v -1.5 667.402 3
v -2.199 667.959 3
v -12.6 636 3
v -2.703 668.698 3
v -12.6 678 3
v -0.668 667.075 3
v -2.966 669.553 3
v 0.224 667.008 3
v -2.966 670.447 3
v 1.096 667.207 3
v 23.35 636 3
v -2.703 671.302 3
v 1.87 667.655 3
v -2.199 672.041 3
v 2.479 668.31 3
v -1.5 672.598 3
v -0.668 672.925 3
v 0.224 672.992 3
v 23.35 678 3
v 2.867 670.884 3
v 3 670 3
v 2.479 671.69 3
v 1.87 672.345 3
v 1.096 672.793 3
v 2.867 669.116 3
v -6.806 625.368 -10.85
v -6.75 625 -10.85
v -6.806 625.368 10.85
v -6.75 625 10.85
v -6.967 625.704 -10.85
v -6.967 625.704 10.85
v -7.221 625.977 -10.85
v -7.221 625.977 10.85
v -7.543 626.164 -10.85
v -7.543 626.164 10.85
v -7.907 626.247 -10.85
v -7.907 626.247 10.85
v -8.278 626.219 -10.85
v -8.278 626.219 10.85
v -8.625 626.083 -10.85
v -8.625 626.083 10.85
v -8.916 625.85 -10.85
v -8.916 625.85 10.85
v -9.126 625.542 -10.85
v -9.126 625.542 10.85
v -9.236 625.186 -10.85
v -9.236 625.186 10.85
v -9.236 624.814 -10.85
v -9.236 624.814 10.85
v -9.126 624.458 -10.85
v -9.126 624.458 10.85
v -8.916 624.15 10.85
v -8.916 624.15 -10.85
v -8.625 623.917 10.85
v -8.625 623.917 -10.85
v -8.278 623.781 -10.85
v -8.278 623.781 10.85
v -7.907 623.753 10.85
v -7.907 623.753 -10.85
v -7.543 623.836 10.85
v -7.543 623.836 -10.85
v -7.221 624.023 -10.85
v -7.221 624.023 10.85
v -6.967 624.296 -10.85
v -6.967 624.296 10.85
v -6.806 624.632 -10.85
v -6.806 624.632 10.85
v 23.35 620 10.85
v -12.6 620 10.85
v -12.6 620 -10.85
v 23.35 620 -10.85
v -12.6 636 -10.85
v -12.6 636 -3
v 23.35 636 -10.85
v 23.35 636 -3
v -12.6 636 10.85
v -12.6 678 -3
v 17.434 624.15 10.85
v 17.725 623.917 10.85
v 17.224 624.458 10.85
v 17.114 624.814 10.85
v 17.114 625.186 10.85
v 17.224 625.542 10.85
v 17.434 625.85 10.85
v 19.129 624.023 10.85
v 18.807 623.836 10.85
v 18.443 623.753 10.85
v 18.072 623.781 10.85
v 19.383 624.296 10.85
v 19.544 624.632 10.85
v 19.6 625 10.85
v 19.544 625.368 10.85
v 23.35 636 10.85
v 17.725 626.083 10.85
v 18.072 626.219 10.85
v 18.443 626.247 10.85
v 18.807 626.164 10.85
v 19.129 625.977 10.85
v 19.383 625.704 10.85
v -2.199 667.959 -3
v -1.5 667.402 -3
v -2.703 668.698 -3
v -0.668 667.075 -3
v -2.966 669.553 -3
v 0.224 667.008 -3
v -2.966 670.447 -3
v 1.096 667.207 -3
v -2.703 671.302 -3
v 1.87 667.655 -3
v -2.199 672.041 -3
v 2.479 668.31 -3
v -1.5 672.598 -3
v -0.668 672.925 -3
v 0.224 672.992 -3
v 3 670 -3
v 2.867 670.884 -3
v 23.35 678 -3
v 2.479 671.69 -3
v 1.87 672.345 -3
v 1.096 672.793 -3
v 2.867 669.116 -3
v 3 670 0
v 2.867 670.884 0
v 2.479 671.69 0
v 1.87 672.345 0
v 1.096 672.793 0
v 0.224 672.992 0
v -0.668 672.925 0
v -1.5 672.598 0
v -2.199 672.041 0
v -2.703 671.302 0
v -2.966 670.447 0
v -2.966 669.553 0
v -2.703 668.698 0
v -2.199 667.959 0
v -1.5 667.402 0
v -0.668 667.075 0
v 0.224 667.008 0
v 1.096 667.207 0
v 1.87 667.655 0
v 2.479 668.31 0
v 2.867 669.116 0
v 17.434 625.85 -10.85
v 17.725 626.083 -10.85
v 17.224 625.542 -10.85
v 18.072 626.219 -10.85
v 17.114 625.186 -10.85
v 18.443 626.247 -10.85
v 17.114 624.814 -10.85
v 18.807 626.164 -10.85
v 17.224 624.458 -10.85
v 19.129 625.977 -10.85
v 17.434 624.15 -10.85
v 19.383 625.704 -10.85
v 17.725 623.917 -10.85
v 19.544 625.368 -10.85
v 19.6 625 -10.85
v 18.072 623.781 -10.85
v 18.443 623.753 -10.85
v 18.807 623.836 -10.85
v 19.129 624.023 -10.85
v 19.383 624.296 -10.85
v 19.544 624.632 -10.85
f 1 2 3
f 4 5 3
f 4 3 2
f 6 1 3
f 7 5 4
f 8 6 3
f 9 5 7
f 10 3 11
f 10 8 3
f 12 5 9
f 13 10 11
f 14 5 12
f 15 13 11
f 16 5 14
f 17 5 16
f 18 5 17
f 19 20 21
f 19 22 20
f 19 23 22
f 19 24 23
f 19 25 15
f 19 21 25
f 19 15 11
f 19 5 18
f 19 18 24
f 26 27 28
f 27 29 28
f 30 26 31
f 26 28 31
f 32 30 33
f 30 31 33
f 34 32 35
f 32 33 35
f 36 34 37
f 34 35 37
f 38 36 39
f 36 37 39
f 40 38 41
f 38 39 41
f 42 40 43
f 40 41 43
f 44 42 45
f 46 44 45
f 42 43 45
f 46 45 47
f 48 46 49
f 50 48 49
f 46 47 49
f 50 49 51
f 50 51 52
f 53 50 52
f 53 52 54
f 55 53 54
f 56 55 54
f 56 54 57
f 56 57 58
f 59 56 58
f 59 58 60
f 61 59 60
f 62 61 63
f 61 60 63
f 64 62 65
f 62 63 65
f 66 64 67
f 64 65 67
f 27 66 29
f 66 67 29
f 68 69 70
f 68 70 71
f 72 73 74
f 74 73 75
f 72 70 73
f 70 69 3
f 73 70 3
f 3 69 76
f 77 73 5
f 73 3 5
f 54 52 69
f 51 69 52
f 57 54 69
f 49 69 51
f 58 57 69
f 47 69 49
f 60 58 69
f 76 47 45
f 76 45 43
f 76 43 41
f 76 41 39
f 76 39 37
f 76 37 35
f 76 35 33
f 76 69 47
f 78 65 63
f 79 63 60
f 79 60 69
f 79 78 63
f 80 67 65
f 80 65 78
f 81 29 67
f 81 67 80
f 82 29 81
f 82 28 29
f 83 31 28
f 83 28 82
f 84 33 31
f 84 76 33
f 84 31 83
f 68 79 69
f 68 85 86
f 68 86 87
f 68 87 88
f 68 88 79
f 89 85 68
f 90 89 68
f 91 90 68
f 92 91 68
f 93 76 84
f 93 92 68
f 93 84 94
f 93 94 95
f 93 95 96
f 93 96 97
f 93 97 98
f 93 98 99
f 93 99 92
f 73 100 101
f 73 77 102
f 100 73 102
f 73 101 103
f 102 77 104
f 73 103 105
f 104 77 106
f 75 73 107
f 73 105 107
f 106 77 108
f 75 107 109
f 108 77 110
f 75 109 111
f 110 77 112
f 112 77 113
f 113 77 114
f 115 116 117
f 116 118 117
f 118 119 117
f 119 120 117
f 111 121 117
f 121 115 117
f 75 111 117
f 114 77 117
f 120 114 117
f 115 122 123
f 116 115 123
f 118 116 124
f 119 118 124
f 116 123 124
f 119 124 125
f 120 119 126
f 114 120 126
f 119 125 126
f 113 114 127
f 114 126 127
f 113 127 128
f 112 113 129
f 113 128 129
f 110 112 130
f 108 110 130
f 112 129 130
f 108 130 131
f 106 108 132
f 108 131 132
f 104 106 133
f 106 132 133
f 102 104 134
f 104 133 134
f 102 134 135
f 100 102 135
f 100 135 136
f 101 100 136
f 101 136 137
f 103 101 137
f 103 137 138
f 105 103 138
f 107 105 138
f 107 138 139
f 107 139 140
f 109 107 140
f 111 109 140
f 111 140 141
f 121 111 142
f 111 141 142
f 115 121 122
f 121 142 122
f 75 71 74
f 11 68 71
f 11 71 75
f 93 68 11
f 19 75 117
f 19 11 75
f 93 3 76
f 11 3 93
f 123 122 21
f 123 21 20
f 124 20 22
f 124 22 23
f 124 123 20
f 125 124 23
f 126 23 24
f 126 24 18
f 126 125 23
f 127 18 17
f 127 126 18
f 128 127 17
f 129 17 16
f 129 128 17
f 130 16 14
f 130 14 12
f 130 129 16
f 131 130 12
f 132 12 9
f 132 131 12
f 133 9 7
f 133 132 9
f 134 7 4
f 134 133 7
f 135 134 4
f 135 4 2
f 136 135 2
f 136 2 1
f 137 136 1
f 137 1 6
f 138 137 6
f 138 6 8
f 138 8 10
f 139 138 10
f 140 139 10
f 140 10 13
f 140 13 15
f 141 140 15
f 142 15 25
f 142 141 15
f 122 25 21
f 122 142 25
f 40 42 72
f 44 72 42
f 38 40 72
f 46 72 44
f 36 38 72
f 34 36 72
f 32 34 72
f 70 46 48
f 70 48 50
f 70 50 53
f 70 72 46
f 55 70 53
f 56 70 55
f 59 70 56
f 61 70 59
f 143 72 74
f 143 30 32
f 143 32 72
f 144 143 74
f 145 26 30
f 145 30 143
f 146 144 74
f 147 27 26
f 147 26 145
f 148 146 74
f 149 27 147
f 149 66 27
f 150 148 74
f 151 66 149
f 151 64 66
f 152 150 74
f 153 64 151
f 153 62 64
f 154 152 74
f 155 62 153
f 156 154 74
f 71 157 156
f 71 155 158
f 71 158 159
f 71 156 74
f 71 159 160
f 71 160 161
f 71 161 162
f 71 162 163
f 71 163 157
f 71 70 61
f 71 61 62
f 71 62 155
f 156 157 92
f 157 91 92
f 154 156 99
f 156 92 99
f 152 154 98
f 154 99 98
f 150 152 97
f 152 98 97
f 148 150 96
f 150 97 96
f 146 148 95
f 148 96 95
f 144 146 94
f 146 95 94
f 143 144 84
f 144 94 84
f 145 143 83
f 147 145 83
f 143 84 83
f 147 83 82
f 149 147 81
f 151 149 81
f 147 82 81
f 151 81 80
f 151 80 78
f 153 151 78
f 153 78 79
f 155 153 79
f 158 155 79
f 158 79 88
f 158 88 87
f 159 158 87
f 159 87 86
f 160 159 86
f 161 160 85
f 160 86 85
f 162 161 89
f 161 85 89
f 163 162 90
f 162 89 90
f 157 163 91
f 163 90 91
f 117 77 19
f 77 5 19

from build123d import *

# Parameters (mm, degrees)
SIDE_W                                      = 35.95
SIDE_H                                      = 10
AUFSATZ_LINEAR_AUSTRAGEN1_DEPTH             = 10.85
AUFSATZ_LINEAR_AUSTRAGEN1_DEPTH_BACK        = 10.85
SKIZZE5_R                                   = 1.25
SCHNITT_LINEAR_AUSTRAGEN1_DEPTH             = 11.85
SCHNITT_LINEAR_AUSTRAGEN1_DEPTH_BACK        = 11.85
TOPEXTENSION_W                              = 35.95
TOPEXTENSION_H                              = 48
TOPEXTENSION_R                              = 3
AUFSATZ_LINEAR_AUSTRAGEN2_DEPTH             = 3
AUFSATZ_LINEAR_AUSTRAGEN2_DEPTH_BACK        = 3
AUFSATZ_LINEAR_AUSTRAGEN3_REACH             = 12.85
SKIZZE8_W                                   = 35.95
SKIZZE8_H                                   = 6
AUFSATZ_LINEAR_AUSTRAGEN3_DIRECTION_2_REACH = 12.85


with BuildPart() as part:
    # Side → Aufsatz-Linear austragen1 (new body, two sides)
    with BuildSketch(Plane.XY) as aufsatz_linear_austragen1_sk:
        with Locations((5.375, 625)):
            Rectangle(SIDE_W, SIDE_H)
    extrude(amount=AUFSATZ_LINEAR_AUSTRAGEN1_DEPTH)
    extrude(aufsatz_linear_austragen1_sk.sketch, amount=-AUFSATZ_LINEAR_AUSTRAGEN1_DEPTH_BACK)

    # Skizze5 → Schnitt-Linear austragen1 (cut, two sides)
    with BuildSketch(Plane.XY) as schnitt_linear_austragen1_sk:
        with Locations((-8, 625)):
            Circle(SKIZZE5_R)
        with Locations((18.35, 625)):
            Circle(SKIZZE5_R)
    extrude(amount=SCHNITT_LINEAR_AUSTRAGEN1_DEPTH, mode=Mode.SUBTRACT)
    extrude(schnitt_linear_austragen1_sk.sketch, amount=-SCHNITT_LINEAR_AUSTRAGEN1_DEPTH_BACK, mode=Mode.SUBTRACT)

    # TopExtension → Aufsatz-Linear austragen2 (add, two sides)
    with BuildSketch(Plane.XY) as aufsatz_linear_austragen2_sk:
        with Locations((5.375, 654)):
            Rectangle(TOPEXTENSION_W, TOPEXTENSION_H)
        with Locations((0, 670)):
            Circle(TOPEXTENSION_R, mode=Mode.SUBTRACT)
    extrude(amount=AUFSATZ_LINEAR_AUSTRAGEN2_DEPTH)
    extrude(aufsatz_linear_austragen2_sk.sketch, amount=-AUFSATZ_LINEAR_AUSTRAGEN2_DEPTH_BACK)

    # Aufsatz-Linear austragen3: up to this face of the body (flat: up to its plane)
    aufsatz_linear_austragen3_end = Plane(part.part.faces().sort_by_distance((5.38061508, 625, 10.85))[0])
    # Skizze8 → Aufsatz-Linear austragen3 (add, up to the picked face)
    with BuildSketch(Plane.XY, mode=Mode.PRIVATE) as aufsatz_linear_austragen3_sk1:
        with Locations((5.375, 633)):
            Rectangle(SKIZZE8_W, SKIZZE8_H)
    aufsatz_linear_austragen3_tool1 = split(extrude(aufsatz_linear_austragen3_sk1.sketch, amount=AUFSATZ_LINEAR_AUSTRAGEN3_REACH, mode=Mode.PRIVATE), bisect_by=aufsatz_linear_austragen3_end, keep=Keep.BOTH, mode=Mode.PRIVATE)
    add(aufsatz_linear_austragen3_tool1.solids().sort_by_distance((5.375, 633, 0))[0])

    # Aufsatz-Linear austragen3 direction 2: up to this face of the body (flat: up to its plane)
    aufsatz_linear_austragen3_direction_2_end = Plane(part.part.faces().sort_by_distance((5.38061508, 625, -10.85))[0])
    # Skizze8 → Aufsatz-Linear austragen3 direction 2 (add, up to the picked face)
    with BuildSketch(Plane.XY, mode=Mode.PRIVATE) as aufsatz_linear_austragen3_direction_2_sk1:
        with Locations((5.375, 633)):
            Rectangle(SKIZZE8_W, SKIZZE8_H)
    aufsatz_linear_austragen3_direction_2_tool1 = split(extrude(aufsatz_linear_austragen3_direction_2_sk1.sketch, amount=-AUFSATZ_LINEAR_AUSTRAGEN3_DIRECTION_2_REACH, mode=Mode.PRIVATE), bisect_by=aufsatz_linear_austragen3_direction_2_end, keep=Keep.BOTH, mode=Mode.PRIVATE)
    add(aufsatz_linear_austragen3_direction_2_tool1.solids().sort_by_distance((5.375, 633, 0))[0])


solid = part.part
